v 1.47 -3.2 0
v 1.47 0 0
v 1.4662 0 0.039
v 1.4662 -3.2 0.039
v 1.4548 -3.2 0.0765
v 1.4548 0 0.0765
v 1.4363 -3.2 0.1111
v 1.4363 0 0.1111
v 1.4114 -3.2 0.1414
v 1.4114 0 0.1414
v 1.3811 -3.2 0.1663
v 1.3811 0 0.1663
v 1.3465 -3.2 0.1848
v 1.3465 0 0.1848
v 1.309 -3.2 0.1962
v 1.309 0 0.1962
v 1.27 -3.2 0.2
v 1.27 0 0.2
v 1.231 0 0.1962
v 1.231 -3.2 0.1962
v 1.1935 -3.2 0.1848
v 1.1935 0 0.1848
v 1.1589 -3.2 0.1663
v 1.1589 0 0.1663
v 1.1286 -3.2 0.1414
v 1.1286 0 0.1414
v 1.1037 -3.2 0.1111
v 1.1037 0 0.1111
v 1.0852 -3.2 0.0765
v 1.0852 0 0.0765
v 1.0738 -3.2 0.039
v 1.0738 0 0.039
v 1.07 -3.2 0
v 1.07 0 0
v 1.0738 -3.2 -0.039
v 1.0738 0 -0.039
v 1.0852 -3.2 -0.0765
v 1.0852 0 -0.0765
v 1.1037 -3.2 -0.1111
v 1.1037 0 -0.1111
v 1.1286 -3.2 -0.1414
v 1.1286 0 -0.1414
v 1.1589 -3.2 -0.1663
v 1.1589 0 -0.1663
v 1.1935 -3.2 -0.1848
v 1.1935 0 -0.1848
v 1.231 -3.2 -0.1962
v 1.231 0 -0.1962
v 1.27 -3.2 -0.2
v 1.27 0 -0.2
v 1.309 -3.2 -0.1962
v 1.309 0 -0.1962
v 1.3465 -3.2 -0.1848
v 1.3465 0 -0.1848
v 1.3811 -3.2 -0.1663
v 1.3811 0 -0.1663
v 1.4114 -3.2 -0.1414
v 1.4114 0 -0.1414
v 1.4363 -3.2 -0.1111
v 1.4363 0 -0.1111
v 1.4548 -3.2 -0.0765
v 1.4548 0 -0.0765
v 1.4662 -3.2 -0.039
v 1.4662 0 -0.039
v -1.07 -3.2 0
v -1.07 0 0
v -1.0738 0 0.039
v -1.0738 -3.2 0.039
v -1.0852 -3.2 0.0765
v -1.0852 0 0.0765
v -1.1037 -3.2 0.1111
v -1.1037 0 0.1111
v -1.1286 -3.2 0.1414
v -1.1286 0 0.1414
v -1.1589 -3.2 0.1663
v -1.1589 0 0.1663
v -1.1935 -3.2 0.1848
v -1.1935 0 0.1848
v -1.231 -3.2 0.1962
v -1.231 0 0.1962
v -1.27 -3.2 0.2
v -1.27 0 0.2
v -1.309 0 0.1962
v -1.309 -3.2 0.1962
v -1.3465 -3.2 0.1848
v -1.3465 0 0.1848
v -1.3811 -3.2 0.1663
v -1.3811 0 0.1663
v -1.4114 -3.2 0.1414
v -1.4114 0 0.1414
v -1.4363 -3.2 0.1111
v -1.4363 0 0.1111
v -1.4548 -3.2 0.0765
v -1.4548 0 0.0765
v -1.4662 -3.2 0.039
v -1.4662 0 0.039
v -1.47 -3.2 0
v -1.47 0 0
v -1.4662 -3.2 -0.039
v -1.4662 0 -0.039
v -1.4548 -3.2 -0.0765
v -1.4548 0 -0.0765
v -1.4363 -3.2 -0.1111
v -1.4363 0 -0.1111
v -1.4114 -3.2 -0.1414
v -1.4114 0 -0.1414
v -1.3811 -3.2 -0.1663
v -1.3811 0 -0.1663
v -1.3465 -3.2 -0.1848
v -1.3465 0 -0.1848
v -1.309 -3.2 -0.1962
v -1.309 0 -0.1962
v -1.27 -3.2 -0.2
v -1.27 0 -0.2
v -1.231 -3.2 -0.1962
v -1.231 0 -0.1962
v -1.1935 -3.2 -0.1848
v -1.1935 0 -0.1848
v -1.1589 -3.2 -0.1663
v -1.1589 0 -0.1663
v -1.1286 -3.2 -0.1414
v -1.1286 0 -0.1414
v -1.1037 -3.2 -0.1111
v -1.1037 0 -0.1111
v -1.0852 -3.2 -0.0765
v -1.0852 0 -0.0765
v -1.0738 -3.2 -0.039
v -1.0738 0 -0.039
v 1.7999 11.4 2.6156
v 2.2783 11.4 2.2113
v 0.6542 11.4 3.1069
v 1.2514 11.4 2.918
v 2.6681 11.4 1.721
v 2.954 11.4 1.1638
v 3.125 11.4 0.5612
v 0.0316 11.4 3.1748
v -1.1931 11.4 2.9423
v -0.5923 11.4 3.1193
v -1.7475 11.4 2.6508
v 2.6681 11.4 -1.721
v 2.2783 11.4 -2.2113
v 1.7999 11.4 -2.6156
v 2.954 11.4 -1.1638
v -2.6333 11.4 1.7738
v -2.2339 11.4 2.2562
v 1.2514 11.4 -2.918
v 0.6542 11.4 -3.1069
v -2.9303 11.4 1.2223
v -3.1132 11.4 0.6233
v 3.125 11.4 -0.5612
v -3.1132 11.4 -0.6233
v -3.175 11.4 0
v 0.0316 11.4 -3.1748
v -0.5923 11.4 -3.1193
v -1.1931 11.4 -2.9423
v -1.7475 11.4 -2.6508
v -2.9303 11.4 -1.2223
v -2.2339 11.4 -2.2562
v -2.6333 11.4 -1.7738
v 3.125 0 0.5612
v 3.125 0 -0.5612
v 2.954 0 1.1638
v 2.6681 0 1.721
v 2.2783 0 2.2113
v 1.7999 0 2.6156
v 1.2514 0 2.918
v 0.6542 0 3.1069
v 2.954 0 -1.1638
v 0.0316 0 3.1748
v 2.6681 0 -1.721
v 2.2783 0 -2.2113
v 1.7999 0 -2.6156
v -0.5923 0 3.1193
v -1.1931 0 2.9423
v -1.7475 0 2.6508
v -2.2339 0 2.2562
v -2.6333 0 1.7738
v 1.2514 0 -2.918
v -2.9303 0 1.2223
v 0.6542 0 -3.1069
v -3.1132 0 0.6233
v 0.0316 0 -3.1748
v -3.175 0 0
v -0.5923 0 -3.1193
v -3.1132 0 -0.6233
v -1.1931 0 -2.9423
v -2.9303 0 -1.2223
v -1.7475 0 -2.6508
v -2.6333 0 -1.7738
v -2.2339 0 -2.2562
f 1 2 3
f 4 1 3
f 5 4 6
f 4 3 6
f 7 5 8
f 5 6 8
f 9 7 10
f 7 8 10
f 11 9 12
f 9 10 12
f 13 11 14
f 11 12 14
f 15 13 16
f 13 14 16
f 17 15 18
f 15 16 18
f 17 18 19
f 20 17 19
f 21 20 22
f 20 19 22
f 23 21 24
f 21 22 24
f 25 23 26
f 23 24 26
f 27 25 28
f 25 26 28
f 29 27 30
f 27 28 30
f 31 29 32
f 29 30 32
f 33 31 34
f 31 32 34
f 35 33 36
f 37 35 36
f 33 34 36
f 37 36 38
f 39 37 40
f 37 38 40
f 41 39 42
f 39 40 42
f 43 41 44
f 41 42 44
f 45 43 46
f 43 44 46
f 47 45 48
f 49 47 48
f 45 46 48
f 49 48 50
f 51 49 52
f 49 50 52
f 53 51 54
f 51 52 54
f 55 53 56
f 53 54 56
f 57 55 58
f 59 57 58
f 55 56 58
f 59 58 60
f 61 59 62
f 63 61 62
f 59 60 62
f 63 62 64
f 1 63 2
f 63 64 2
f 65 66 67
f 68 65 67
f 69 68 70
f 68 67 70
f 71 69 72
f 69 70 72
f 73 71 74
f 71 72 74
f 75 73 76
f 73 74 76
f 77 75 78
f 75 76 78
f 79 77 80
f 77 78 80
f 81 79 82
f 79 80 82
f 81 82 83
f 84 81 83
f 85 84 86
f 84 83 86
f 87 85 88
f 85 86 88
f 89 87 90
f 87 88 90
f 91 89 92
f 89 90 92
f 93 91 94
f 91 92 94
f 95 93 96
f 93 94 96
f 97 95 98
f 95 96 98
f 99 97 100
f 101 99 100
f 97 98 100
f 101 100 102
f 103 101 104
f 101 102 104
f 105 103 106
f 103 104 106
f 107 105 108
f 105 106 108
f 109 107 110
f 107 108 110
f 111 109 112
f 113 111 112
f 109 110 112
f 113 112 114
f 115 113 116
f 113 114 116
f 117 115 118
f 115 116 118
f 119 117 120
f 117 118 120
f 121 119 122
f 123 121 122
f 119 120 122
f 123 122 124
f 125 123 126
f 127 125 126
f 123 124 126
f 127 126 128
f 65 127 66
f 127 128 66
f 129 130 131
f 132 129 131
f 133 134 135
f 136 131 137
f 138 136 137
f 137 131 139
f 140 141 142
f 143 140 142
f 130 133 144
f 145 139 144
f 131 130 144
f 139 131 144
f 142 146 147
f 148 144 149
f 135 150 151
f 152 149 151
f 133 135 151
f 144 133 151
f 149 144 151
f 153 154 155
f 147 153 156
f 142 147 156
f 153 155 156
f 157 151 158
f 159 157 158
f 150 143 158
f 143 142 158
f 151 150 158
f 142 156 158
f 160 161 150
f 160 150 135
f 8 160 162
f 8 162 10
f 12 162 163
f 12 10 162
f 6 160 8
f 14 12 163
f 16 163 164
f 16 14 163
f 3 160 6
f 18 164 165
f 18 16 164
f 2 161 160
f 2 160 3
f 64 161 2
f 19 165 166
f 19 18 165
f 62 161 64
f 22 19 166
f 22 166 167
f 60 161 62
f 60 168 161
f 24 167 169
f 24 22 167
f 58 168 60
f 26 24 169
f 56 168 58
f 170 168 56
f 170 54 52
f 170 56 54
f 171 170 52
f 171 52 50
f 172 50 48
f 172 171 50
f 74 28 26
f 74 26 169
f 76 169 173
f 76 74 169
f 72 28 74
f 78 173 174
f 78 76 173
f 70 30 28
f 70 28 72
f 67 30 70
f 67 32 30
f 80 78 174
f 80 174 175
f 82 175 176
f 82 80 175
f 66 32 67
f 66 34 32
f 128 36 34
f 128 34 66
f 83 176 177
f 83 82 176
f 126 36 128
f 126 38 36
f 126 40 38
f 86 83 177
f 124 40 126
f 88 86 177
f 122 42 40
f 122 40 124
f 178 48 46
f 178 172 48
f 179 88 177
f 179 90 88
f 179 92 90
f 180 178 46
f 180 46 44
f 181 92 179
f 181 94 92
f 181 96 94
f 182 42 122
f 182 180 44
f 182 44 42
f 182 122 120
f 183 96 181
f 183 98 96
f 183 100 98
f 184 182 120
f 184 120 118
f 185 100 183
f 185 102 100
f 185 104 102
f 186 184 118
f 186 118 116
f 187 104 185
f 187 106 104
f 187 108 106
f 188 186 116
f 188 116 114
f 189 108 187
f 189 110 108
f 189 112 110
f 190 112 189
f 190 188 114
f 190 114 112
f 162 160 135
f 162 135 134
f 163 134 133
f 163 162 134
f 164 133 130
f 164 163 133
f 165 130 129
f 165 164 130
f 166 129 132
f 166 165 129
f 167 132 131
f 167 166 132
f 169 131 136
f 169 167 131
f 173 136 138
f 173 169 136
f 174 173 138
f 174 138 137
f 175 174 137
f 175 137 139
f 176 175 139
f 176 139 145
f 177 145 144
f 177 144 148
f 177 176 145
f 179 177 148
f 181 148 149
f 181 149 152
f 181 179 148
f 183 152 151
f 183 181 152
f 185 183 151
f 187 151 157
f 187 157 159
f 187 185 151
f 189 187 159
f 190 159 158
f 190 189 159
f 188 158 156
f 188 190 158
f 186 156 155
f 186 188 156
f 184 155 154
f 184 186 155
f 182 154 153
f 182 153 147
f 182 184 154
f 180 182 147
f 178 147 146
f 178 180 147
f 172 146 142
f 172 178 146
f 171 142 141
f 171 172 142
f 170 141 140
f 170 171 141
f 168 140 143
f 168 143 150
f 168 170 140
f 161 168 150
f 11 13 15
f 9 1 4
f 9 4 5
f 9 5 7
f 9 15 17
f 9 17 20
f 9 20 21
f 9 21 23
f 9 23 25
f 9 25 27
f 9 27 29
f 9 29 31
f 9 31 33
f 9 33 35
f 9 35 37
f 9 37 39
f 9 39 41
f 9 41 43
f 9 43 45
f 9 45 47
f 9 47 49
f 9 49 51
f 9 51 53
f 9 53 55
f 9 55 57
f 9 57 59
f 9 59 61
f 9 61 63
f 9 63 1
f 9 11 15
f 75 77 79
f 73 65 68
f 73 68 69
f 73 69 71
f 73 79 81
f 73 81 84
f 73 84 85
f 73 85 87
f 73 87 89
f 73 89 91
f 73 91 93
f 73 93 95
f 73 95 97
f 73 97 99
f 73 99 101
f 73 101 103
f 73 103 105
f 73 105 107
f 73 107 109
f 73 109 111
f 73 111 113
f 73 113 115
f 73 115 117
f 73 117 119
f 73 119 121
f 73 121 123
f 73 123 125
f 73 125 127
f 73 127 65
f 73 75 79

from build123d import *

# Parameters (mm, degrees)
BOSS_EXTRUDE1_DEPTH = 11.4
SKETCH2_R           = 0.2
BOSS_EXTRUDE2_DEPTH = 3.2


with BuildPart() as part:
    # Sketch1 → Boss-Extrude1 (new body)
    with BuildSketch(Plane(origin=(0, 0, 0), x_dir=(1, 0, 0), z_dir=(0, 1, 0))):
        with BuildLine():
            Line((3.125, 0.561248608), (3.125, -0.561248608))
            ThreePointArc((3.125, -0.561248608), (-3.175, 0), (3.125, 0.561248608))
        make_face()
    extrude(amount=BOSS_EXTRUDE1_DEPTH)

    # Sketch2 → Boss-Extrude2 (add)
    with BuildSketch(Plane.XZ):
        with Locations((-1.27, 0)):
            Circle(SKETCH2_R)
        with Locations((1.27, 0)):
            Circle(SKETCH2_R)
    extrude(amount=BOSS_EXTRUDE2_DEPTH)


solid = part.part
